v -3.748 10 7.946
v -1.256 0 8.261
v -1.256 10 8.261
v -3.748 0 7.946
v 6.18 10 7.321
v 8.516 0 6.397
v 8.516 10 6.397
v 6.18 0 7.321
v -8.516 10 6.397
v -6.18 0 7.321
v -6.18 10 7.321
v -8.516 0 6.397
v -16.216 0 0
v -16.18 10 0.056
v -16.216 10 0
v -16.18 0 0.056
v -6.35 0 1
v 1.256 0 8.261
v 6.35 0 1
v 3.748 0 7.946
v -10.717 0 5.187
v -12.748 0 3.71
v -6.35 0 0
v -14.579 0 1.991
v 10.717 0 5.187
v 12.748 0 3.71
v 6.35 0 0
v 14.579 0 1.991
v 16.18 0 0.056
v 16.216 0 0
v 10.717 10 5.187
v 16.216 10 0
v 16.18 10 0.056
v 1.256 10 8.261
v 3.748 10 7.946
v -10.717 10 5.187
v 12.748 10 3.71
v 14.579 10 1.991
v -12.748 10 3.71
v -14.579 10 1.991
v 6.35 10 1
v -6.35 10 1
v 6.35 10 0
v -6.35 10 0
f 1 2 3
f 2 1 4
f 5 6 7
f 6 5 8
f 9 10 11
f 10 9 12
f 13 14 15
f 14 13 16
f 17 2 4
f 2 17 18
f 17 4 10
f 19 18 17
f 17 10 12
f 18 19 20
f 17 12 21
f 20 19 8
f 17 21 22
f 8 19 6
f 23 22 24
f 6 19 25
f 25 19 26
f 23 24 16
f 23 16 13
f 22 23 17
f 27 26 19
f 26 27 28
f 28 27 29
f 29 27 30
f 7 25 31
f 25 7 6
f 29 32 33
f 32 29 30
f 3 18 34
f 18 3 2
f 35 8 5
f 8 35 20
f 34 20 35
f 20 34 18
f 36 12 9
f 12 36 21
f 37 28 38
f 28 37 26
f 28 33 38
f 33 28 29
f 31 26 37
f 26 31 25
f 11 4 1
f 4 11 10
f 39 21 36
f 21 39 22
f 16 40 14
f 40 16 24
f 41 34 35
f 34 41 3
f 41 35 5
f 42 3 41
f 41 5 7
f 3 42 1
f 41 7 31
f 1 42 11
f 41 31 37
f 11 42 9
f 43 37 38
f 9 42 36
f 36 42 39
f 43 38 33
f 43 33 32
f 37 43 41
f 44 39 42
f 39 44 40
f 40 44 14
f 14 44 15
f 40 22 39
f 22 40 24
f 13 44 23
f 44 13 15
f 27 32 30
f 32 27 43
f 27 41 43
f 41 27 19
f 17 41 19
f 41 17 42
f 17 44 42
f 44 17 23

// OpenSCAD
lc_s = 12.7;
c_w = 40.0;
c_l = 10.0;
d_h = lc_s - 1;
fn = 50;

translate ([0, 0, -d_h])
difference() {
  translate([0, c_l, 0])rotate([90, 0, 0]) cylinder(r=c_w/2.0, h=c_l, $fn=fn);
  translate([-30, 0, d_h-60]) cube([60, 60, 60]);
  translate([-lc_s/2.0, 0, 0]) cube([lc_s, 80, lc_s]);
}
